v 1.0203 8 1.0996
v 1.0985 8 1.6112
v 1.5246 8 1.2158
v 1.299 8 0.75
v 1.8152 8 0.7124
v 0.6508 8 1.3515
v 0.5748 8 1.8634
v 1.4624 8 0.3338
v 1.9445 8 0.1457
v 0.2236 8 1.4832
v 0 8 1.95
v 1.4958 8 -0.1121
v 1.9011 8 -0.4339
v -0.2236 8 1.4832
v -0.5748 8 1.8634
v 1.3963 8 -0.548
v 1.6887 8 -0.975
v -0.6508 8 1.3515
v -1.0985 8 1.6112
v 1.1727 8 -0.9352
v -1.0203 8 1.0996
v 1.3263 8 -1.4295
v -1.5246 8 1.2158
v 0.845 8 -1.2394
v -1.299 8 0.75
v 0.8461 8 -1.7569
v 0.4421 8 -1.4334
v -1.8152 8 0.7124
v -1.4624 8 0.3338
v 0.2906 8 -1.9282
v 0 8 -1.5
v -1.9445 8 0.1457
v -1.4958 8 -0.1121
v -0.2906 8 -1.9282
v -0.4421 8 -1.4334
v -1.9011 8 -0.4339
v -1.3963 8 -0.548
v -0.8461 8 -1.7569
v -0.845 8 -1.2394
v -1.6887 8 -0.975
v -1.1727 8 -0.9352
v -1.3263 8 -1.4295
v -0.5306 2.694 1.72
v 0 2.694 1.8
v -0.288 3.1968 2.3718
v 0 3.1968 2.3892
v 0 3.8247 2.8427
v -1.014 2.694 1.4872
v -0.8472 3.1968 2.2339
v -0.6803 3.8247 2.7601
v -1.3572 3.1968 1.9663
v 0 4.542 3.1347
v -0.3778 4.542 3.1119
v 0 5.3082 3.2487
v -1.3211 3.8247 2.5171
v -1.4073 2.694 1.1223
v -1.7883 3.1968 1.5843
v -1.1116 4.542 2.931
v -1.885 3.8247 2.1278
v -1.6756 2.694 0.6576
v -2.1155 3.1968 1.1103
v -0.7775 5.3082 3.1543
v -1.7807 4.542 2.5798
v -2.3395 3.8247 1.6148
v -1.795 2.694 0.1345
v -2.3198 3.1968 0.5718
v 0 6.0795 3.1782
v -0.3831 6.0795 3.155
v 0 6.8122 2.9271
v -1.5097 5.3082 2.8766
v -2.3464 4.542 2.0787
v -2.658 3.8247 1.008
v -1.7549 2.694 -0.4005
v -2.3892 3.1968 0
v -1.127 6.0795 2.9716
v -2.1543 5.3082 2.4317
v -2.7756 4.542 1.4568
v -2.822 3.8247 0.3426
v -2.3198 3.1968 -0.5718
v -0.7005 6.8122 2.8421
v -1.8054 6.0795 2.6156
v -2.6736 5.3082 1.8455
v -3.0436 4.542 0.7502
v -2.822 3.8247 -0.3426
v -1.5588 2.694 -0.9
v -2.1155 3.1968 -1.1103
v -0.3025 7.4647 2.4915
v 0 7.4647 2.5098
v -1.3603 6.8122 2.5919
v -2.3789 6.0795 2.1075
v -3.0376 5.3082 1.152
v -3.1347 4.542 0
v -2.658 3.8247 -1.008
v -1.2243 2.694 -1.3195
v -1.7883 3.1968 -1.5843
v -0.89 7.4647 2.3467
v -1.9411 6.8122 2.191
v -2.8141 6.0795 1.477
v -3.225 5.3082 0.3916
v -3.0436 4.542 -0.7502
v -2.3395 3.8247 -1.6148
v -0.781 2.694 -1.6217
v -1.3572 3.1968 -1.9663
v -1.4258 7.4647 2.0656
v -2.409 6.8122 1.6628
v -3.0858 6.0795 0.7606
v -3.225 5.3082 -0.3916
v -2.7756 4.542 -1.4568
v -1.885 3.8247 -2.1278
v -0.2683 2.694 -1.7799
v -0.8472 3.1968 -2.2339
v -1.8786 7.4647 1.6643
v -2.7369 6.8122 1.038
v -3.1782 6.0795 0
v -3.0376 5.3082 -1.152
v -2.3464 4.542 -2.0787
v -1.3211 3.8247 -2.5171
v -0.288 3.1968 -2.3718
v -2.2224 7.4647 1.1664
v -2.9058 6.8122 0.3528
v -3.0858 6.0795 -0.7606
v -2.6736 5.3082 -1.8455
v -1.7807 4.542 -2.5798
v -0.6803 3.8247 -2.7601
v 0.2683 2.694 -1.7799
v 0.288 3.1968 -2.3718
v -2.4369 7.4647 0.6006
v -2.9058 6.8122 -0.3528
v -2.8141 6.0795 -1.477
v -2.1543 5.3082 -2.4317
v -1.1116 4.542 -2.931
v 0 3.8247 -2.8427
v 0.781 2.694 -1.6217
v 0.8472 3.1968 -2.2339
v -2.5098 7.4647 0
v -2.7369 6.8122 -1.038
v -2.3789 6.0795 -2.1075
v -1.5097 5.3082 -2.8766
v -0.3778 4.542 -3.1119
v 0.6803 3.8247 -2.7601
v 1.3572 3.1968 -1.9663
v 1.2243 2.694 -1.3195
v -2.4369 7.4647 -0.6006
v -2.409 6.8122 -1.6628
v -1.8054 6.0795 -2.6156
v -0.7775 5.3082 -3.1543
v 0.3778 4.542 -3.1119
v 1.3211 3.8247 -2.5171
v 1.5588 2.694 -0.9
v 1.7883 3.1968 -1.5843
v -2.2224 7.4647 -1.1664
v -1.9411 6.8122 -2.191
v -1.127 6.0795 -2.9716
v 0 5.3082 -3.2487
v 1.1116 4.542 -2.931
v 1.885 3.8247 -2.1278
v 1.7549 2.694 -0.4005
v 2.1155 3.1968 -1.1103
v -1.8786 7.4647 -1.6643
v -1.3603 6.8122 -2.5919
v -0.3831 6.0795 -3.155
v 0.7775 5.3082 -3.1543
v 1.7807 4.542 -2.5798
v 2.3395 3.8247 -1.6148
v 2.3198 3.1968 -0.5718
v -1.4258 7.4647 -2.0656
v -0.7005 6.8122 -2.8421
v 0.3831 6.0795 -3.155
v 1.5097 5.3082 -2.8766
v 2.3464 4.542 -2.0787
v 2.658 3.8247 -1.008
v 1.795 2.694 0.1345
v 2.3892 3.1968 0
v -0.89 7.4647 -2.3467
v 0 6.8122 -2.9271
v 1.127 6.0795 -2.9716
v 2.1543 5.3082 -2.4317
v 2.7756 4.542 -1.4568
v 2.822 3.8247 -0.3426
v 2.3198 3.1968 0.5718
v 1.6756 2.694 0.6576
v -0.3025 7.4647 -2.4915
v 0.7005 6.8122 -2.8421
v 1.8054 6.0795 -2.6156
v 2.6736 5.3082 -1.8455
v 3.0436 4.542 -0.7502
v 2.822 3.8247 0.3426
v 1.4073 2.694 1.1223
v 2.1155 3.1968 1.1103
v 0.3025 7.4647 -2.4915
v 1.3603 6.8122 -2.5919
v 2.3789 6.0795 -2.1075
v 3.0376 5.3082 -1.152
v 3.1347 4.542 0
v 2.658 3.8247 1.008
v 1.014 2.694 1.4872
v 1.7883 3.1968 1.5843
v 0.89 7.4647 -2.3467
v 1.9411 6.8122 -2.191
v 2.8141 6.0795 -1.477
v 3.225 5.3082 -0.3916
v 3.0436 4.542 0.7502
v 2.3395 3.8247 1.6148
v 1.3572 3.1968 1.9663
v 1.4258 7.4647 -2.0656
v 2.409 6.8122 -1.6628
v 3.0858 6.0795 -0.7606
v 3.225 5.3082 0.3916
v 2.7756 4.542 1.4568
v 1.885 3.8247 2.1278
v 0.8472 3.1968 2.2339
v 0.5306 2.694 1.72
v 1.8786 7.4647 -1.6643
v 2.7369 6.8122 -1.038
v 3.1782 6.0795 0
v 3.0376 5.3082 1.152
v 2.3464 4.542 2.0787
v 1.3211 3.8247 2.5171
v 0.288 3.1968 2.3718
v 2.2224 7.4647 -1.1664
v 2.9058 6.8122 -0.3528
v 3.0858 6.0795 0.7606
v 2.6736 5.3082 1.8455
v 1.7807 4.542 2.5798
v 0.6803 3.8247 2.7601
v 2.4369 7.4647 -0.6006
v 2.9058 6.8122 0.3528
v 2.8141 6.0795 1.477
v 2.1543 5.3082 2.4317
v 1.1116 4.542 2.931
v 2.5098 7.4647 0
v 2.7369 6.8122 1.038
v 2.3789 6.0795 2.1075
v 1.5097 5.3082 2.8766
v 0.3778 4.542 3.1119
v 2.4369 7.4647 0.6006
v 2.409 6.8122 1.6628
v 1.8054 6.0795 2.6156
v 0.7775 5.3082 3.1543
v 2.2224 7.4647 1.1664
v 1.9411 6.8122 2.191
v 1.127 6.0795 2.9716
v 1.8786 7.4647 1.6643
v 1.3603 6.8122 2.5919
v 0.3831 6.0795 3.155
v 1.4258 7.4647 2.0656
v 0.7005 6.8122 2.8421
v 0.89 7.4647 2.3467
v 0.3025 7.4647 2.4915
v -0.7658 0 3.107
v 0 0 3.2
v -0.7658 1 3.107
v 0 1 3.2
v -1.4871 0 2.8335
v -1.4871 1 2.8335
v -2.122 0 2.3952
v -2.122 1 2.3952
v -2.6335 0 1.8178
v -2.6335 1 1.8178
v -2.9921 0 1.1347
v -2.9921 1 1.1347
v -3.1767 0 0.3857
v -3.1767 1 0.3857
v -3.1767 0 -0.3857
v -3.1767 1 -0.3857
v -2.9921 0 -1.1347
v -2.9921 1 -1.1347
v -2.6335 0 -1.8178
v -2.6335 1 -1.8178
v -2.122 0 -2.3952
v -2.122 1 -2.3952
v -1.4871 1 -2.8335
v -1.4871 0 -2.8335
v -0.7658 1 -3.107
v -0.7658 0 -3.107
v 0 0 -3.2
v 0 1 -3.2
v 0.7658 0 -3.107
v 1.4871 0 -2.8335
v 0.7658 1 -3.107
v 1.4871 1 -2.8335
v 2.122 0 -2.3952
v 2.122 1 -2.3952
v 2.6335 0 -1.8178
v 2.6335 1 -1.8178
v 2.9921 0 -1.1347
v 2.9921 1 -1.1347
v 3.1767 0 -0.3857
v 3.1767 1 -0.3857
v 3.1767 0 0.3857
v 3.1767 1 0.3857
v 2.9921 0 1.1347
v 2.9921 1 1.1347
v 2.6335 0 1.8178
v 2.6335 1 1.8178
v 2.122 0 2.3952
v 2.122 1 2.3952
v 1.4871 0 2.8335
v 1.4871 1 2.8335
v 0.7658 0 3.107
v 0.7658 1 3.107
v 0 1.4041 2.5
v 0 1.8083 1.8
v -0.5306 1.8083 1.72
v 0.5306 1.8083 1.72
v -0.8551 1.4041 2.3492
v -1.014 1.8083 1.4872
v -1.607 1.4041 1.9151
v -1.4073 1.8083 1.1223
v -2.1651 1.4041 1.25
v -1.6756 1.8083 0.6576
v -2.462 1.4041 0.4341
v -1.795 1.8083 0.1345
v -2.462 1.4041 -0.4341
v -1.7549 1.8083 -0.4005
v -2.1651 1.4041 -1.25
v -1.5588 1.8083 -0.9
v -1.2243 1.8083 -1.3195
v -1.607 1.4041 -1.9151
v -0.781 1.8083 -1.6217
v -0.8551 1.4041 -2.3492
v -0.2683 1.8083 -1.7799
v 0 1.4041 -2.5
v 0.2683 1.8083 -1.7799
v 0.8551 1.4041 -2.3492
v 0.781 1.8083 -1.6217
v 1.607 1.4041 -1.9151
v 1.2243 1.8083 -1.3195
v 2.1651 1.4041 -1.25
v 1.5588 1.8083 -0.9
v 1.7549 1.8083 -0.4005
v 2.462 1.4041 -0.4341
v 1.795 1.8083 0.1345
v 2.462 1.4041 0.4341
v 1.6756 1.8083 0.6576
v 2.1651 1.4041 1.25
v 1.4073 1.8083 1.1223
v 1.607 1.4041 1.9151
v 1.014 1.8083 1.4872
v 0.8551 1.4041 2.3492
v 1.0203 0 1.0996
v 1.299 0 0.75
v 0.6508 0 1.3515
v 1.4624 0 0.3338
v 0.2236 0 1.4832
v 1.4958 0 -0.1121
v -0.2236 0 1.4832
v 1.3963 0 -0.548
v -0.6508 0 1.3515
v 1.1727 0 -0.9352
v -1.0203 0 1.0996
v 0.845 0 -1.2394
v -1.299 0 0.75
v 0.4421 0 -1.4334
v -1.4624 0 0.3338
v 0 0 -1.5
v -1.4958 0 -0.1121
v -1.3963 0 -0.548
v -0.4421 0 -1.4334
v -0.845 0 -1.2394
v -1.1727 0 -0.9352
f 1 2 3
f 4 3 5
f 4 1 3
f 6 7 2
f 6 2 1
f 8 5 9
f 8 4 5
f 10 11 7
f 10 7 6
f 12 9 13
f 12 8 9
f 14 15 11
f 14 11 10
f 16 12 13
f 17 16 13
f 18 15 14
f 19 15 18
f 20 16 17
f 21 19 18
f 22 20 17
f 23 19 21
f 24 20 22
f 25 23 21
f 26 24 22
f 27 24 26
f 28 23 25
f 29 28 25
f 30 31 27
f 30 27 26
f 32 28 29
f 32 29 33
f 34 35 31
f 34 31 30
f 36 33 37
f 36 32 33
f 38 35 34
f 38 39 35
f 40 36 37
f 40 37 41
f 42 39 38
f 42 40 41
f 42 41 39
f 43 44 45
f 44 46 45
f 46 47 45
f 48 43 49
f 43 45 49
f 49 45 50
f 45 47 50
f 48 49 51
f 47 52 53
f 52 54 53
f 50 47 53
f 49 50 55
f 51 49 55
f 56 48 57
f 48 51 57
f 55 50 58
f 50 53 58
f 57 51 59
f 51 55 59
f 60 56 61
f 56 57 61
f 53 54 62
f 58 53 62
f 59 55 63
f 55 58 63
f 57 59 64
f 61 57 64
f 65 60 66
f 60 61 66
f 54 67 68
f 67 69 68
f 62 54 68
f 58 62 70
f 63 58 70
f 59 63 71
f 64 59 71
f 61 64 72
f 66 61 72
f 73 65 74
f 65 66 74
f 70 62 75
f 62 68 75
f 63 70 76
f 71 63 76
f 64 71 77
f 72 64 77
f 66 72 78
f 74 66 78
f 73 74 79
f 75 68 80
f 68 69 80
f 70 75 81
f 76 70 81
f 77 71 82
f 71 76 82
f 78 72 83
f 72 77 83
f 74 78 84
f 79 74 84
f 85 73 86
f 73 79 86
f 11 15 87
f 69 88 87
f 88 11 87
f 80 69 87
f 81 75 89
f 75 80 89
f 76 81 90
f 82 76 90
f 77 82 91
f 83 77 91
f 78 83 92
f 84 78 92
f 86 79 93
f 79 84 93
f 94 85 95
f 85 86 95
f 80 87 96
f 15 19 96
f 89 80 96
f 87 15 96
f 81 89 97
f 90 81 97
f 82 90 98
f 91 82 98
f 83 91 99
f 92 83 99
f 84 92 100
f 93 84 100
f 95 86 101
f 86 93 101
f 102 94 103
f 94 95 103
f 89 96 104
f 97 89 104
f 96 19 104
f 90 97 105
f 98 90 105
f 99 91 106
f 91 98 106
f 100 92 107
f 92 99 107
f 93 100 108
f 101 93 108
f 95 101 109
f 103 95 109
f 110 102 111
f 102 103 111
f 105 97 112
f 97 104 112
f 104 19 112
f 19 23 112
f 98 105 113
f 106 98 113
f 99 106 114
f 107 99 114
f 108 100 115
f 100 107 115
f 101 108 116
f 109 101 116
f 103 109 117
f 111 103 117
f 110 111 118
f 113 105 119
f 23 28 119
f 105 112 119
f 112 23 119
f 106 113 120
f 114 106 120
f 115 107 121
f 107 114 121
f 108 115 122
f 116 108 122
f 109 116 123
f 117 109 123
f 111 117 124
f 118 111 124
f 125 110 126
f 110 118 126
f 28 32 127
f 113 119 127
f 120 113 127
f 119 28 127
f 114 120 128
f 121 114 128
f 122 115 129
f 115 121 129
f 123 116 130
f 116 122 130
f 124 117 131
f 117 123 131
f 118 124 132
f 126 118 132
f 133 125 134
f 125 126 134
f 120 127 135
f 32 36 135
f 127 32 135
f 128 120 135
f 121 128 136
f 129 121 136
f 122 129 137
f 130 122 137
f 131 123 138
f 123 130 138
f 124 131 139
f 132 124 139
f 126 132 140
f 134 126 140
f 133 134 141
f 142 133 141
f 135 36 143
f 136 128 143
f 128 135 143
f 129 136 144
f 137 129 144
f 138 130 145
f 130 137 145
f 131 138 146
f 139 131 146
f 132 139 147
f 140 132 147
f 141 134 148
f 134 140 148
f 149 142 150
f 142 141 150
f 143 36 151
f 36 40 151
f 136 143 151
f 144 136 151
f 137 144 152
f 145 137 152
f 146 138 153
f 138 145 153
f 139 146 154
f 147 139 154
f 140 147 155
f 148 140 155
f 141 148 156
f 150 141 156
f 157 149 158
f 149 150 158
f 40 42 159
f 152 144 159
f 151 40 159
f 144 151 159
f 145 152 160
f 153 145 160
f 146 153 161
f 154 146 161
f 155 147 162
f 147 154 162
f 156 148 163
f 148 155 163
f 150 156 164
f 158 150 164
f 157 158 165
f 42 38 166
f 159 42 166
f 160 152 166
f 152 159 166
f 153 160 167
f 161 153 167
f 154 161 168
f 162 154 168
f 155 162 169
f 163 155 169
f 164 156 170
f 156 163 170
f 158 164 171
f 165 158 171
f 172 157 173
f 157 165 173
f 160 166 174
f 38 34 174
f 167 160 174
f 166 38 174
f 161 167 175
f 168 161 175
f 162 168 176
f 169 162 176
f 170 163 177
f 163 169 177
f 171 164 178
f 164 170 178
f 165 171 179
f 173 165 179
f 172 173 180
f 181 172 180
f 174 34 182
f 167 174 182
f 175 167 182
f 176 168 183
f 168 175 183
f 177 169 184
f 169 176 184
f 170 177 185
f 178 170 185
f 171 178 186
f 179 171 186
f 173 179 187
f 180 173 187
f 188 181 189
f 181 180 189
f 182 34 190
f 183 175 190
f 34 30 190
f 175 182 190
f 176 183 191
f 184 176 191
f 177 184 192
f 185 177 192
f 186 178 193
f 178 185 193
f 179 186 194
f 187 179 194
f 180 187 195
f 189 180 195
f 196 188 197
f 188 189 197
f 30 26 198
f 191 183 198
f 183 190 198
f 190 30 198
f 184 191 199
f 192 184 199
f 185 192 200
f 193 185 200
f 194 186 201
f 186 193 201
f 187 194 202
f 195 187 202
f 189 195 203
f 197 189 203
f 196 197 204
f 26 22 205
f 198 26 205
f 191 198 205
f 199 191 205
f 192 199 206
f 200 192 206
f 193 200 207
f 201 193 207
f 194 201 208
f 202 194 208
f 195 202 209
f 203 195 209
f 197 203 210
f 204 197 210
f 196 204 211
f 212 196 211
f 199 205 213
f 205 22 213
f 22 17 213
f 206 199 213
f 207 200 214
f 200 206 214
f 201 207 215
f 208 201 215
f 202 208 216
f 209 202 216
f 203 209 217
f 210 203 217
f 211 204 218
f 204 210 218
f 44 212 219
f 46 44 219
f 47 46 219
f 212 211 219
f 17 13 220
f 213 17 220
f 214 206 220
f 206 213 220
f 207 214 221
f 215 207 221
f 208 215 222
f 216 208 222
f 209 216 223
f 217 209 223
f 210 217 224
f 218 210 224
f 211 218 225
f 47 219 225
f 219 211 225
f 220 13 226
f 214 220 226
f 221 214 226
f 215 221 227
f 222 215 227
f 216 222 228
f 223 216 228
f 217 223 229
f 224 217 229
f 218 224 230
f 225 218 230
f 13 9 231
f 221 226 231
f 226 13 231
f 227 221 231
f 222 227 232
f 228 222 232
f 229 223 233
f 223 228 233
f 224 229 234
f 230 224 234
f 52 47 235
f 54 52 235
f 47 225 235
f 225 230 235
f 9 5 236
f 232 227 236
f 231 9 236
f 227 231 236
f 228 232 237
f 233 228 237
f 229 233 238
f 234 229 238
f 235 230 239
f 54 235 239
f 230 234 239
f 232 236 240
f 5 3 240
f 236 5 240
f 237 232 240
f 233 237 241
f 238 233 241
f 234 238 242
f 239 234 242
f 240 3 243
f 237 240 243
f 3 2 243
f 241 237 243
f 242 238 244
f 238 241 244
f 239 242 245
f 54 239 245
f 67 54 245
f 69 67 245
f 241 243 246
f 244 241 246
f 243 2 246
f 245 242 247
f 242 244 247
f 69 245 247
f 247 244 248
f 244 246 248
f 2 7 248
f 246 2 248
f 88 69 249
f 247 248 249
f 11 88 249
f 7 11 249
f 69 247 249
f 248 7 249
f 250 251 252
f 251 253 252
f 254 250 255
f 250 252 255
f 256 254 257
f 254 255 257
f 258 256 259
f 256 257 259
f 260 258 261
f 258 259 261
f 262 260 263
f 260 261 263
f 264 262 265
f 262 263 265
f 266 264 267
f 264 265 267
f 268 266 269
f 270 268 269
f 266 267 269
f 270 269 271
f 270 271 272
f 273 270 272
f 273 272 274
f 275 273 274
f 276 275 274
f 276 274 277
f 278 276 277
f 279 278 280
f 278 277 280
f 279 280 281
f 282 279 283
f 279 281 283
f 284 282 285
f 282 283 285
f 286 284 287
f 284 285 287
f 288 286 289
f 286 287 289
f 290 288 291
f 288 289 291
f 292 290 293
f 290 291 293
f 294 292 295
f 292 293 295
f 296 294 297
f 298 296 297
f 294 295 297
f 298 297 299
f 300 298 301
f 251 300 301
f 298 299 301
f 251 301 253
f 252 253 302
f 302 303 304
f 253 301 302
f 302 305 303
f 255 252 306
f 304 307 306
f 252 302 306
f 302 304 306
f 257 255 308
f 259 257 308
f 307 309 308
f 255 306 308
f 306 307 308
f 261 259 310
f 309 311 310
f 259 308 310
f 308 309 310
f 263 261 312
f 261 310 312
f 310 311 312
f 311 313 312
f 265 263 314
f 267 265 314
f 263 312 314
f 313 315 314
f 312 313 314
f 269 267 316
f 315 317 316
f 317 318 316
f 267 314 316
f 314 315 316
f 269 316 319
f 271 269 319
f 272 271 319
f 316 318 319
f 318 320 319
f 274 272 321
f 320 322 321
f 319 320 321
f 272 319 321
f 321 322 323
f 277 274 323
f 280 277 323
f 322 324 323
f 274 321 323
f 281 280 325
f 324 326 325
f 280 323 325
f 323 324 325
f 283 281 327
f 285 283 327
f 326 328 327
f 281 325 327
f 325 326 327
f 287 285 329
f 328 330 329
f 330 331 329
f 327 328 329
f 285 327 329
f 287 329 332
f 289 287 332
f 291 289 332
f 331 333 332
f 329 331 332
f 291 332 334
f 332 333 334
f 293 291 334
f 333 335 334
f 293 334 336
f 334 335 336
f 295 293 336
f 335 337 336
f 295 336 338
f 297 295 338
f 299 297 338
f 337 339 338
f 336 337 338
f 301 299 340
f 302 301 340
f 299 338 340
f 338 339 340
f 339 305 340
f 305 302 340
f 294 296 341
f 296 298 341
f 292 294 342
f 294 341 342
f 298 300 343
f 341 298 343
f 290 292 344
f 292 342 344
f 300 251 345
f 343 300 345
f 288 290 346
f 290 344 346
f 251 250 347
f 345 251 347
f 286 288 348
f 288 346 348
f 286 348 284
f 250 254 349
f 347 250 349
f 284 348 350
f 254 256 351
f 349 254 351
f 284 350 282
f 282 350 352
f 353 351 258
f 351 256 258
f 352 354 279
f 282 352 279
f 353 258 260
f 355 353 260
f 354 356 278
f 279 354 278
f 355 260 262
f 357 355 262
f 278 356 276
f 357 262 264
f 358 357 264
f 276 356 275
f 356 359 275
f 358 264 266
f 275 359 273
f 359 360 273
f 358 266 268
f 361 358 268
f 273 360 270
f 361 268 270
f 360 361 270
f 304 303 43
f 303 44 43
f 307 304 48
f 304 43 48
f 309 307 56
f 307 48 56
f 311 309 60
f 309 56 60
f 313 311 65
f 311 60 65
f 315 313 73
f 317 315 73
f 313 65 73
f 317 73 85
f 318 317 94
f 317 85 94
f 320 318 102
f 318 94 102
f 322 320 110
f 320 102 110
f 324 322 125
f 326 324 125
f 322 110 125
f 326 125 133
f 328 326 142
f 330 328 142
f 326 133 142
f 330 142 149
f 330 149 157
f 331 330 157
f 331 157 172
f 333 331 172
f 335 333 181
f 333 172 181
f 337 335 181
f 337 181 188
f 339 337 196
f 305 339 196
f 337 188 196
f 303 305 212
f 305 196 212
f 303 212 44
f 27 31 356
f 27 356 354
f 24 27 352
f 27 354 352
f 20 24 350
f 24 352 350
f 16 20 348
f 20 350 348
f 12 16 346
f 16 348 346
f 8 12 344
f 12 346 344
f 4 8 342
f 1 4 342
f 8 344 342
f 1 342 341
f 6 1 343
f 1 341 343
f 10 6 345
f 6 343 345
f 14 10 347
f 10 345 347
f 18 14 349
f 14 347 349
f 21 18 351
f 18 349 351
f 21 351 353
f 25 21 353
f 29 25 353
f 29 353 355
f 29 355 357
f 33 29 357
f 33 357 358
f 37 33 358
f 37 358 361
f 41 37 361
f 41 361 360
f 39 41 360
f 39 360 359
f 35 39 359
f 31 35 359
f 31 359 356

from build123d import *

# Parameters (mm, degrees)
SKETCH2_R               = 1.5
CUT_EXTRUDE1_DEPTH      = 10
CUT_EXTRUDE2_DEPTH      = 10
CUT_EXTRUDE2_DEPTH_BACK = 10
SKETCH3_W               = 11.471414326
SKETCH3_H               = 1.059782784


with BuildPart() as part:
    # Sketch1 → Revolve1 (revolve)
    with BuildSketch(Plane(origin=(0, 0, 0), x_dir=(0, 0, -1), z_dir=(1, 0, 0))):
        with BuildLine():
            Line((0, 8.65), (0, 0))
            Line((0, 0), (3.2, 0))
            Line((3.2, 0), (3.2, 1))
            Line((3.2, 1), (1.8, 1.808290377))
            Line((1.8, 1.808290377), (1.8, 2.693988174))
            ThreePointArc((1.8, 2.693988174), (3.111031857, 6.340202523), (0, 8.65))
        make_face()
    revolve(axis=Axis((0, 8.65, 0), (0, -1, 0)))

    # Sketch2 → Cut-Extrude1 (cut)
    with BuildSketch(Plane.XZ):
        Circle(SKETCH2_R)
    extrude(amount=-CUT_EXTRUDE1_DEPTH, mode=Mode.SUBTRACT)

    # Sketch3 → Cut-Extrude2 (cut, two sides: drawn at the far end of the back side and taken through both)
    with BuildSketch(Plane(origin=(0, 0, 0), x_dir=(0, 0, -1), z_dir=(1, 0, 0)).offset(-CUT_EXTRUDE2_DEPTH_BACK)):
        with Locations((2.521032719, 8.529891392)):
            Rectangle(SKETCH3_W, SKETCH3_H)
    extrude(amount=CUT_EXTRUDE2_DEPTH + CUT_EXTRUDE2_DEPTH_BACK, mode=Mode.SUBTRACT)


solid = part.part
